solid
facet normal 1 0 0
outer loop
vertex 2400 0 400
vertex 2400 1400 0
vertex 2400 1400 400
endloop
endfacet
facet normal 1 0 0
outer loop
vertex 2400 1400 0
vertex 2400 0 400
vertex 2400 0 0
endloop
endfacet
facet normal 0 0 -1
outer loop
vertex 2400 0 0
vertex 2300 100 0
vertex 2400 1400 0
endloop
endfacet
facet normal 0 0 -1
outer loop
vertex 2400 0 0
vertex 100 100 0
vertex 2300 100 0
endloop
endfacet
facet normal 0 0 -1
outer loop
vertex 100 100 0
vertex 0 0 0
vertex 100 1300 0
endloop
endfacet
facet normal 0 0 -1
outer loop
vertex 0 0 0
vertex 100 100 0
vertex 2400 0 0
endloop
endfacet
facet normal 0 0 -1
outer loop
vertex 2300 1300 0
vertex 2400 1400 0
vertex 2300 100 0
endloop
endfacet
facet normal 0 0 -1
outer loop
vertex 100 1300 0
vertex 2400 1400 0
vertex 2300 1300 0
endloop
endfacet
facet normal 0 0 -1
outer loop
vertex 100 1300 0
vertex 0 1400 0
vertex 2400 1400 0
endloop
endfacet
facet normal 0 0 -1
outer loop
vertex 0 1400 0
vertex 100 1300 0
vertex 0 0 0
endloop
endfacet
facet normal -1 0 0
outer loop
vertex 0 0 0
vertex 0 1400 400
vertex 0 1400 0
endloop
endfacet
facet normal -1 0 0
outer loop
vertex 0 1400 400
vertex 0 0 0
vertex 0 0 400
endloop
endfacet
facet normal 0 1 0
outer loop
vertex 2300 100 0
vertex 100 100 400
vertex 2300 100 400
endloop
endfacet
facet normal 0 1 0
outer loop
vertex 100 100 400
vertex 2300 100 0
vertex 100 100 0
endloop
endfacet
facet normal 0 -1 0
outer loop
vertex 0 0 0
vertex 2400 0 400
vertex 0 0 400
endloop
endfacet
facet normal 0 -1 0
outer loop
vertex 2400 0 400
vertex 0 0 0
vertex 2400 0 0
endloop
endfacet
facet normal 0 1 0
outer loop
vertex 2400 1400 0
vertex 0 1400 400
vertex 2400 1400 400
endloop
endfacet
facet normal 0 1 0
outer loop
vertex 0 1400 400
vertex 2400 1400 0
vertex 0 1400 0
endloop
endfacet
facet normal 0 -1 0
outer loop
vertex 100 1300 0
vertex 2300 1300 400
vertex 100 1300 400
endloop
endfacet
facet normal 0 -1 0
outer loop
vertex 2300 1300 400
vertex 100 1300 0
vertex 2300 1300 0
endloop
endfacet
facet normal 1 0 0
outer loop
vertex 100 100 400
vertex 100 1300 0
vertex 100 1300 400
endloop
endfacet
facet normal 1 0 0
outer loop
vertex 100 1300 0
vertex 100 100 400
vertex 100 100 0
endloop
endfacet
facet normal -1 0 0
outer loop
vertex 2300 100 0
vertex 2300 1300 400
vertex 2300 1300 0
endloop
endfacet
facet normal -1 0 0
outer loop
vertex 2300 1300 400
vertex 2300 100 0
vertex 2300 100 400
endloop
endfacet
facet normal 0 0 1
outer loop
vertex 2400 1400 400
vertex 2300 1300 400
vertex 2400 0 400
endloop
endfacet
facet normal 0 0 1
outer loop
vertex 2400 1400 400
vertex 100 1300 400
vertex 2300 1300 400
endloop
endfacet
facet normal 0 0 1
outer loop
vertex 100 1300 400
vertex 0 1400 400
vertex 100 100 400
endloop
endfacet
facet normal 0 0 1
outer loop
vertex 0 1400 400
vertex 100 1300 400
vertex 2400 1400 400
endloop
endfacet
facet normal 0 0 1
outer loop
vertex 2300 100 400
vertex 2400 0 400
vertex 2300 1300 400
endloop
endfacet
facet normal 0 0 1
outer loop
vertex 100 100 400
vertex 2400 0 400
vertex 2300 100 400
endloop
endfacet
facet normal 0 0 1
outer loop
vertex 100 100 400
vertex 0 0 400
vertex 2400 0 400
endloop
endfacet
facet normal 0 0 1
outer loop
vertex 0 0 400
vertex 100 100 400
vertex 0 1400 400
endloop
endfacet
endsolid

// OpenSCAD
// Generated from plan.json; millimetres. Not a structural design.
// Open in OpenSCAD. Increase explode_mm to inspect courses.
explode_mm = 0;
$fn = 24;
show_fixing_paths = false;

// offer-bed-01-C1-S
translate([0, 0, 0+0*explode_mm])
  color([0.70,0.52,0.33]) cube([2400, 100, 200]);
// offer-bed-01-C1-N
translate([0, 1300, 0+0*explode_mm])
  color([0.70,0.52,0.33]) cube([2400, 100, 200]);
// offer-bed-01-C1-W
translate([0, 100, 0+0*explode_mm])
  color([0.70,0.52,0.33]) cube([100, 1200, 200]);
// offer-bed-01-C1-E
translate([2300, 100, 0+0*explode_mm])
  color([0.70,0.52,0.33]) cube([100, 1200, 200]);
// offer-bed-01-C2-S
translate([0, 0, 200+1*explode_mm])
  color([0.70,0.52,0.33]) cube([2400, 100, 200]);
// offer-bed-01-C2-N
translate([0, 1300, 200+1*explode_mm])
  color([0.70,0.52,0.33]) cube([2400, 100, 200]);
// offer-bed-01-C2-W
translate([0, 100, 200+1*explode_mm])
  color([0.70,0.52,0.33]) cube([100, 1200, 200]);
// offer-bed-01-C2-E
translate([2300, 100, 200+1*explode_mm])
  color([0.70,0.52,0.33]) cube([100, 1200, 200]);
if (show_fixing_paths) translate([50.0, 1400, 50.0+0*explode_mm]) rotate([90,0,0]) color([0.8,0.1,0.1]) cylinder(d=7, h=150);
if (show_fixing_paths) translate([50.0, 1400, 150.0+0*explode_mm]) rotate([90,0,0]) color([0.8,0.1,0.1]) cylinder(d=7, h=150);
if (show_fixing_paths) translate([2350.0, 1400, 50.0+0*explode_mm]) rotate([90,0,0]) color([0.8,0.1,0.1]) cylinder(d=7, h=150);
if (show_fixing_paths) translate([2350.0, 1400, 150.0+0*explode_mm]) rotate([90,0,0]) color([0.8,0.1,0.1]) cylinder(d=7, h=150);
if (show_fixing_paths) translate([50.0, 0, 50.0+0*explode_mm]) rotate([-90,0,0]) color([0.8,0.1,0.1]) cylinder(d=7, h=150);
if (show_fixing_paths) translate([50.0, 0, 150.0+0*explode_mm]) rotate([-90,0,0]) color([0.8,0.1,0.1]) cylinder(d=7, h=150);
if (show_fixing_paths) translate([2350.0, 0, 50.0+0*explode_mm]) rotate([-90,0,0]) color([0.8,0.1,0.1]) cylinder(d=7, h=150);
if (show_fixing_paths) translate([2350.0, 0, 150.0+0*explode_mm]) rotate([-90,0,0]) color([0.8,0.1,0.1]) cylinder(d=7, h=150);
if (show_fixing_paths) translate([2350.0, 300.0, 400+1*explode_mm]) rotate([180,0,0]) color([0.8,0.1,0.1]) cylinder(d=7, h=250);
if (show_fixing_paths) translate([2350.0, 700.0, 400+1*explode_mm]) rotate([180,0,0]) color([0.8,0.1,0.1]) cylinder(d=7, h=250);
if (show_fixing_paths) translate([2350.0, 1100.0, 400+1*explode_mm]) rotate([180,0,0]) color([0.8,0.1,0.1]) cylinder(d=7, h=250);
if (show_fixing_paths) translate([50.0, 1400, 250.0+1*explode_mm]) rotate([90,0,0]) color([0.8,0.1,0.1]) cylinder(d=7, h=150);
if (show_fixing_paths) translate([50.0, 1400, 350.0+1*explode_mm]) rotate([90,0,0]) color([0.8,0.1,0.1]) cylinder(d=7, h=150);
if (show_fixing_paths) translate([2350.0, 1400, 250.0+1*explode_mm]) rotate([90,0,0]) color([0.8,0.1,0.1]) cylinder(d=7, h=150);
if (show_fixing_paths) translate([2350.0, 1400, 350.0+1*explode_mm]) rotate([90,0,0]) color([0.8,0.1,0.1]) cylinder(d=7, h=150);
if (show_fixing_paths) translate([200.0, 1350.0, 400+1*explode_mm]) rotate([180,0,0]) color([0.8,0.1,0.1]) cylinder(d=7, h=250);
if (show_fixing_paths) translate([700.0, 1350.0, 400+1*explode_mm]) rotate([180,0,0]) color([0.8,0.1,0.1]) cylinder(d=7, h=250);
if (show_fixing_paths) translate([1200.0, 1350.0, 400+1*explode_mm]) rotate([180,0,0]) color([0.8,0.1,0.1]) cylinder(d=7, h=250);
if (show_fixing_paths) translate([1700.0, 1350.0, 400+1*explode_mm]) rotate([180,0,0]) color([0.8,0.1,0.1]) cylinder(d=7, h=250);
if (show_fixing_paths) translate([2200.0, 1350.0, 400+1*explode_mm]) rotate([180,0,0]) color([0.8,0.1,0.1]) cylinder(d=7, h=250);
if (show_fixing_paths) translate([50.0, 0, 250.0+1*explode_mm]) rotate([-90,0,0]) color([0.8,0.1,0.1]) cylinder(d=7, h=150);
if (show_fixing_paths) translate([50.0, 0, 350.0+1*explode_mm]) rotate([-90,0,0]) color([0.8,0.1,0.1]) cylinder(d=7, h=150);
if (show_fixing_paths) translate([2350.0, 0, 250.0+1*explode_mm]) rotate([-90,0,0]) color([0.8,0.1,0.1]) cylinder(d=7, h=150);
if (show_fixing_paths) translate([2350.0, 0, 350.0+1*explode_mm]) rotate([-90,0,0]) color([0.8,0.1,0.1]) cylinder(d=7, h=150);
if (show_fixing_paths) translate([200.0, 50.0, 400+1*explode_mm]) rotate([180,0,0]) color([0.8,0.1,0.1]) cylinder(d=7, h=250);
if (show_fixing_paths) translate([700.0, 50.0, 400+1*explode_mm]) rotate([180,0,0]) color([0.8,0.1,0.1]) cylinder(d=7, h=250);
if (show_fixing_paths) translate([1200.0, 50.0, 400+1*explode_mm]) rotate([180,0,0]) color([0.8,0.1,0.1]) cylinder(d=7, h=250);
if (show_fixing_paths) translate([1700.0, 50.0, 400+1*explode_mm]) rotate([180,0,0]) color([0.8,0.1,0.1]) cylinder(d=7, h=250);
if (show_fixing_paths) translate([2200.0, 50.0, 400+1*explode_mm]) rotate([180,0,0]) color([0.8,0.1,0.1]) cylinder(d=7, h=250);
if (show_fixing_paths) translate([50.0, 300.0, 400+1*explode_mm]) rotate([180,0,0]) color([0.8,0.1,0.1]) cylinder(d=7, h=250);
if (show_fixing_paths) translate([50.0, 700.0, 400+1*explode_mm]) rotate([180,0,0]) color([0.8,0.1,0.1]) cylinder(d=7, h=250);
if (show_fixing_paths) translate([50.0, 1100.0, 400+1*explode_mm]) rotate([180,0,0]) color([0.8,0.1,0.1]) cylinder(d=7, h=250);
